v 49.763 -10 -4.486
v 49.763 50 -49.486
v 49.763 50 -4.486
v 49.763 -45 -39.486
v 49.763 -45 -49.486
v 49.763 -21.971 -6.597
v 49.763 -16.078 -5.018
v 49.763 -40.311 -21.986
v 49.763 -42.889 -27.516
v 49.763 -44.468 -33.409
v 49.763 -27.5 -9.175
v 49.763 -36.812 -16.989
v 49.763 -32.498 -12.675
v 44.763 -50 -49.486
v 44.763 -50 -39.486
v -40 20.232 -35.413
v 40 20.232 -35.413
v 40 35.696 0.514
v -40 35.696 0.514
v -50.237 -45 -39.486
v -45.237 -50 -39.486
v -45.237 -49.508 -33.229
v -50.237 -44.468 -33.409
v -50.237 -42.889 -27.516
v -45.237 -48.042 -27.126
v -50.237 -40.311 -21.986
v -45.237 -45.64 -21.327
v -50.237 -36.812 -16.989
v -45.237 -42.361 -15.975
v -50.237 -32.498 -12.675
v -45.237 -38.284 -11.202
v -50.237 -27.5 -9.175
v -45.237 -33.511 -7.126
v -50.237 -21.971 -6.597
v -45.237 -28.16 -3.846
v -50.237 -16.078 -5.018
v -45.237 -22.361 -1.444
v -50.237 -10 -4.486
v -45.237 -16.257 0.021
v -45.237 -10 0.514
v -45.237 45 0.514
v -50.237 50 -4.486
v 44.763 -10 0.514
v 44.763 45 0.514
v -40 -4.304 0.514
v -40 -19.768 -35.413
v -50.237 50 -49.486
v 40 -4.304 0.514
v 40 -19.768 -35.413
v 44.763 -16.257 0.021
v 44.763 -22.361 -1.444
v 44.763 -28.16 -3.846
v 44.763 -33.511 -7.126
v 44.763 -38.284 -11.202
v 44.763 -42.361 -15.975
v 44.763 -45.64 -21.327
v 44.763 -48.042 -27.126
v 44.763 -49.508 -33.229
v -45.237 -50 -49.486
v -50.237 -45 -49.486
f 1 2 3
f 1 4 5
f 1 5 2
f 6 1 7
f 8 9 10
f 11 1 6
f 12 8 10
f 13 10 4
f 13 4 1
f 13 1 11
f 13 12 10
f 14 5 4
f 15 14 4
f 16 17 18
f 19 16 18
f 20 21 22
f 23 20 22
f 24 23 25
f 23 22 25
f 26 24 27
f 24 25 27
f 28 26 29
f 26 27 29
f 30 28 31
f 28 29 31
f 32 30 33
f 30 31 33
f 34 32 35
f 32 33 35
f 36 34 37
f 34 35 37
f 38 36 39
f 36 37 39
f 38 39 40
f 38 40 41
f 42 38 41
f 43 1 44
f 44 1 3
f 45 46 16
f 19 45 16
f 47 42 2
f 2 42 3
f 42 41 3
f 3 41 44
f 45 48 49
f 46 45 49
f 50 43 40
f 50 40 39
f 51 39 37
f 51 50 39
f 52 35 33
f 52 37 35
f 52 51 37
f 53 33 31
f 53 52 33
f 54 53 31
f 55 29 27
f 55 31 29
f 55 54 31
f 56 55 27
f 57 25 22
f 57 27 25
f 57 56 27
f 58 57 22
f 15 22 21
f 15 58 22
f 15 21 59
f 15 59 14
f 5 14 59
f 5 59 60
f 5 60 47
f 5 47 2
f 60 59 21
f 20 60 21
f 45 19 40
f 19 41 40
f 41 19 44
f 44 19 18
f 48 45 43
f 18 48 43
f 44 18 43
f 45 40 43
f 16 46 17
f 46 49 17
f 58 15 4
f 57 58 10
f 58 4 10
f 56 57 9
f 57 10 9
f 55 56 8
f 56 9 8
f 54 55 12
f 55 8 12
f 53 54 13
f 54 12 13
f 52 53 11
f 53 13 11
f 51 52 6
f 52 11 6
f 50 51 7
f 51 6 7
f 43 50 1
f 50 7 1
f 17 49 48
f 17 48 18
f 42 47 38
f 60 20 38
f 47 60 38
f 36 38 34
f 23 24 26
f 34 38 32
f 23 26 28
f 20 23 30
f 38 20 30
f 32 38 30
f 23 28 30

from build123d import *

# Parameters (mm, degrees)
F0_W     = 100
F0_H     = 50
F1_DEPTH = 50
F3_DEPTH = 40
F4_R     = 40
F5_SIZE  = 5
F6_SIZE  = 5
F7_SIZE  = 5


with BuildPart() as f1:
    # F0 (on Front) → F1 (new body, symmetric)
    with BuildSketch(Plane.XZ):
        with Locations((-0.236801, -24.486255)):
            Rectangle(F0_W, F0_H)
    extrude(amount=F1_DEPTH, both=True)

    # F2 (on Right) → F3 (cut, symmetric)
    with BuildSketch(Plane.YZ):
        Polygon((20.232478, -35.412774), (40, 10.513745), (0, 10.513745), (-19.767522, -35.412774), align=None)
    extrude(amount=F3_DEPTH, both=True, mode=Mode.SUBTRACT)

    # F4
    f4_edges = [f1.edges().sort_by_distance(p)[0] for p in [
        (-0.236801, -50, 0.513745),
    ]]
    fillet(f4_edges, radius=F4_R)

    # F5
    f5_edges = [f1.edges().sort_by_distance(p)[0] for p in [
        (-50.236801, 20, 0.513745),
    ]]
    chamfer(f5_edges, length=F5_SIZE)

    # F6
    f6_edges = [f1.edges().sort_by_distance(p)[0] for p in [
        (49.763199, 20, 0.513745),
    ]]
    chamfer(f6_edges, length=F6_SIZE)

    # F7
    f7_edges = [f1.edges().sort_by_distance(p)[0] for p in [
        (-0.236801, 50, 0.513745),
    ]]
    chamfer(f7_edges, length=F7_SIZE)


solid = f1.part
